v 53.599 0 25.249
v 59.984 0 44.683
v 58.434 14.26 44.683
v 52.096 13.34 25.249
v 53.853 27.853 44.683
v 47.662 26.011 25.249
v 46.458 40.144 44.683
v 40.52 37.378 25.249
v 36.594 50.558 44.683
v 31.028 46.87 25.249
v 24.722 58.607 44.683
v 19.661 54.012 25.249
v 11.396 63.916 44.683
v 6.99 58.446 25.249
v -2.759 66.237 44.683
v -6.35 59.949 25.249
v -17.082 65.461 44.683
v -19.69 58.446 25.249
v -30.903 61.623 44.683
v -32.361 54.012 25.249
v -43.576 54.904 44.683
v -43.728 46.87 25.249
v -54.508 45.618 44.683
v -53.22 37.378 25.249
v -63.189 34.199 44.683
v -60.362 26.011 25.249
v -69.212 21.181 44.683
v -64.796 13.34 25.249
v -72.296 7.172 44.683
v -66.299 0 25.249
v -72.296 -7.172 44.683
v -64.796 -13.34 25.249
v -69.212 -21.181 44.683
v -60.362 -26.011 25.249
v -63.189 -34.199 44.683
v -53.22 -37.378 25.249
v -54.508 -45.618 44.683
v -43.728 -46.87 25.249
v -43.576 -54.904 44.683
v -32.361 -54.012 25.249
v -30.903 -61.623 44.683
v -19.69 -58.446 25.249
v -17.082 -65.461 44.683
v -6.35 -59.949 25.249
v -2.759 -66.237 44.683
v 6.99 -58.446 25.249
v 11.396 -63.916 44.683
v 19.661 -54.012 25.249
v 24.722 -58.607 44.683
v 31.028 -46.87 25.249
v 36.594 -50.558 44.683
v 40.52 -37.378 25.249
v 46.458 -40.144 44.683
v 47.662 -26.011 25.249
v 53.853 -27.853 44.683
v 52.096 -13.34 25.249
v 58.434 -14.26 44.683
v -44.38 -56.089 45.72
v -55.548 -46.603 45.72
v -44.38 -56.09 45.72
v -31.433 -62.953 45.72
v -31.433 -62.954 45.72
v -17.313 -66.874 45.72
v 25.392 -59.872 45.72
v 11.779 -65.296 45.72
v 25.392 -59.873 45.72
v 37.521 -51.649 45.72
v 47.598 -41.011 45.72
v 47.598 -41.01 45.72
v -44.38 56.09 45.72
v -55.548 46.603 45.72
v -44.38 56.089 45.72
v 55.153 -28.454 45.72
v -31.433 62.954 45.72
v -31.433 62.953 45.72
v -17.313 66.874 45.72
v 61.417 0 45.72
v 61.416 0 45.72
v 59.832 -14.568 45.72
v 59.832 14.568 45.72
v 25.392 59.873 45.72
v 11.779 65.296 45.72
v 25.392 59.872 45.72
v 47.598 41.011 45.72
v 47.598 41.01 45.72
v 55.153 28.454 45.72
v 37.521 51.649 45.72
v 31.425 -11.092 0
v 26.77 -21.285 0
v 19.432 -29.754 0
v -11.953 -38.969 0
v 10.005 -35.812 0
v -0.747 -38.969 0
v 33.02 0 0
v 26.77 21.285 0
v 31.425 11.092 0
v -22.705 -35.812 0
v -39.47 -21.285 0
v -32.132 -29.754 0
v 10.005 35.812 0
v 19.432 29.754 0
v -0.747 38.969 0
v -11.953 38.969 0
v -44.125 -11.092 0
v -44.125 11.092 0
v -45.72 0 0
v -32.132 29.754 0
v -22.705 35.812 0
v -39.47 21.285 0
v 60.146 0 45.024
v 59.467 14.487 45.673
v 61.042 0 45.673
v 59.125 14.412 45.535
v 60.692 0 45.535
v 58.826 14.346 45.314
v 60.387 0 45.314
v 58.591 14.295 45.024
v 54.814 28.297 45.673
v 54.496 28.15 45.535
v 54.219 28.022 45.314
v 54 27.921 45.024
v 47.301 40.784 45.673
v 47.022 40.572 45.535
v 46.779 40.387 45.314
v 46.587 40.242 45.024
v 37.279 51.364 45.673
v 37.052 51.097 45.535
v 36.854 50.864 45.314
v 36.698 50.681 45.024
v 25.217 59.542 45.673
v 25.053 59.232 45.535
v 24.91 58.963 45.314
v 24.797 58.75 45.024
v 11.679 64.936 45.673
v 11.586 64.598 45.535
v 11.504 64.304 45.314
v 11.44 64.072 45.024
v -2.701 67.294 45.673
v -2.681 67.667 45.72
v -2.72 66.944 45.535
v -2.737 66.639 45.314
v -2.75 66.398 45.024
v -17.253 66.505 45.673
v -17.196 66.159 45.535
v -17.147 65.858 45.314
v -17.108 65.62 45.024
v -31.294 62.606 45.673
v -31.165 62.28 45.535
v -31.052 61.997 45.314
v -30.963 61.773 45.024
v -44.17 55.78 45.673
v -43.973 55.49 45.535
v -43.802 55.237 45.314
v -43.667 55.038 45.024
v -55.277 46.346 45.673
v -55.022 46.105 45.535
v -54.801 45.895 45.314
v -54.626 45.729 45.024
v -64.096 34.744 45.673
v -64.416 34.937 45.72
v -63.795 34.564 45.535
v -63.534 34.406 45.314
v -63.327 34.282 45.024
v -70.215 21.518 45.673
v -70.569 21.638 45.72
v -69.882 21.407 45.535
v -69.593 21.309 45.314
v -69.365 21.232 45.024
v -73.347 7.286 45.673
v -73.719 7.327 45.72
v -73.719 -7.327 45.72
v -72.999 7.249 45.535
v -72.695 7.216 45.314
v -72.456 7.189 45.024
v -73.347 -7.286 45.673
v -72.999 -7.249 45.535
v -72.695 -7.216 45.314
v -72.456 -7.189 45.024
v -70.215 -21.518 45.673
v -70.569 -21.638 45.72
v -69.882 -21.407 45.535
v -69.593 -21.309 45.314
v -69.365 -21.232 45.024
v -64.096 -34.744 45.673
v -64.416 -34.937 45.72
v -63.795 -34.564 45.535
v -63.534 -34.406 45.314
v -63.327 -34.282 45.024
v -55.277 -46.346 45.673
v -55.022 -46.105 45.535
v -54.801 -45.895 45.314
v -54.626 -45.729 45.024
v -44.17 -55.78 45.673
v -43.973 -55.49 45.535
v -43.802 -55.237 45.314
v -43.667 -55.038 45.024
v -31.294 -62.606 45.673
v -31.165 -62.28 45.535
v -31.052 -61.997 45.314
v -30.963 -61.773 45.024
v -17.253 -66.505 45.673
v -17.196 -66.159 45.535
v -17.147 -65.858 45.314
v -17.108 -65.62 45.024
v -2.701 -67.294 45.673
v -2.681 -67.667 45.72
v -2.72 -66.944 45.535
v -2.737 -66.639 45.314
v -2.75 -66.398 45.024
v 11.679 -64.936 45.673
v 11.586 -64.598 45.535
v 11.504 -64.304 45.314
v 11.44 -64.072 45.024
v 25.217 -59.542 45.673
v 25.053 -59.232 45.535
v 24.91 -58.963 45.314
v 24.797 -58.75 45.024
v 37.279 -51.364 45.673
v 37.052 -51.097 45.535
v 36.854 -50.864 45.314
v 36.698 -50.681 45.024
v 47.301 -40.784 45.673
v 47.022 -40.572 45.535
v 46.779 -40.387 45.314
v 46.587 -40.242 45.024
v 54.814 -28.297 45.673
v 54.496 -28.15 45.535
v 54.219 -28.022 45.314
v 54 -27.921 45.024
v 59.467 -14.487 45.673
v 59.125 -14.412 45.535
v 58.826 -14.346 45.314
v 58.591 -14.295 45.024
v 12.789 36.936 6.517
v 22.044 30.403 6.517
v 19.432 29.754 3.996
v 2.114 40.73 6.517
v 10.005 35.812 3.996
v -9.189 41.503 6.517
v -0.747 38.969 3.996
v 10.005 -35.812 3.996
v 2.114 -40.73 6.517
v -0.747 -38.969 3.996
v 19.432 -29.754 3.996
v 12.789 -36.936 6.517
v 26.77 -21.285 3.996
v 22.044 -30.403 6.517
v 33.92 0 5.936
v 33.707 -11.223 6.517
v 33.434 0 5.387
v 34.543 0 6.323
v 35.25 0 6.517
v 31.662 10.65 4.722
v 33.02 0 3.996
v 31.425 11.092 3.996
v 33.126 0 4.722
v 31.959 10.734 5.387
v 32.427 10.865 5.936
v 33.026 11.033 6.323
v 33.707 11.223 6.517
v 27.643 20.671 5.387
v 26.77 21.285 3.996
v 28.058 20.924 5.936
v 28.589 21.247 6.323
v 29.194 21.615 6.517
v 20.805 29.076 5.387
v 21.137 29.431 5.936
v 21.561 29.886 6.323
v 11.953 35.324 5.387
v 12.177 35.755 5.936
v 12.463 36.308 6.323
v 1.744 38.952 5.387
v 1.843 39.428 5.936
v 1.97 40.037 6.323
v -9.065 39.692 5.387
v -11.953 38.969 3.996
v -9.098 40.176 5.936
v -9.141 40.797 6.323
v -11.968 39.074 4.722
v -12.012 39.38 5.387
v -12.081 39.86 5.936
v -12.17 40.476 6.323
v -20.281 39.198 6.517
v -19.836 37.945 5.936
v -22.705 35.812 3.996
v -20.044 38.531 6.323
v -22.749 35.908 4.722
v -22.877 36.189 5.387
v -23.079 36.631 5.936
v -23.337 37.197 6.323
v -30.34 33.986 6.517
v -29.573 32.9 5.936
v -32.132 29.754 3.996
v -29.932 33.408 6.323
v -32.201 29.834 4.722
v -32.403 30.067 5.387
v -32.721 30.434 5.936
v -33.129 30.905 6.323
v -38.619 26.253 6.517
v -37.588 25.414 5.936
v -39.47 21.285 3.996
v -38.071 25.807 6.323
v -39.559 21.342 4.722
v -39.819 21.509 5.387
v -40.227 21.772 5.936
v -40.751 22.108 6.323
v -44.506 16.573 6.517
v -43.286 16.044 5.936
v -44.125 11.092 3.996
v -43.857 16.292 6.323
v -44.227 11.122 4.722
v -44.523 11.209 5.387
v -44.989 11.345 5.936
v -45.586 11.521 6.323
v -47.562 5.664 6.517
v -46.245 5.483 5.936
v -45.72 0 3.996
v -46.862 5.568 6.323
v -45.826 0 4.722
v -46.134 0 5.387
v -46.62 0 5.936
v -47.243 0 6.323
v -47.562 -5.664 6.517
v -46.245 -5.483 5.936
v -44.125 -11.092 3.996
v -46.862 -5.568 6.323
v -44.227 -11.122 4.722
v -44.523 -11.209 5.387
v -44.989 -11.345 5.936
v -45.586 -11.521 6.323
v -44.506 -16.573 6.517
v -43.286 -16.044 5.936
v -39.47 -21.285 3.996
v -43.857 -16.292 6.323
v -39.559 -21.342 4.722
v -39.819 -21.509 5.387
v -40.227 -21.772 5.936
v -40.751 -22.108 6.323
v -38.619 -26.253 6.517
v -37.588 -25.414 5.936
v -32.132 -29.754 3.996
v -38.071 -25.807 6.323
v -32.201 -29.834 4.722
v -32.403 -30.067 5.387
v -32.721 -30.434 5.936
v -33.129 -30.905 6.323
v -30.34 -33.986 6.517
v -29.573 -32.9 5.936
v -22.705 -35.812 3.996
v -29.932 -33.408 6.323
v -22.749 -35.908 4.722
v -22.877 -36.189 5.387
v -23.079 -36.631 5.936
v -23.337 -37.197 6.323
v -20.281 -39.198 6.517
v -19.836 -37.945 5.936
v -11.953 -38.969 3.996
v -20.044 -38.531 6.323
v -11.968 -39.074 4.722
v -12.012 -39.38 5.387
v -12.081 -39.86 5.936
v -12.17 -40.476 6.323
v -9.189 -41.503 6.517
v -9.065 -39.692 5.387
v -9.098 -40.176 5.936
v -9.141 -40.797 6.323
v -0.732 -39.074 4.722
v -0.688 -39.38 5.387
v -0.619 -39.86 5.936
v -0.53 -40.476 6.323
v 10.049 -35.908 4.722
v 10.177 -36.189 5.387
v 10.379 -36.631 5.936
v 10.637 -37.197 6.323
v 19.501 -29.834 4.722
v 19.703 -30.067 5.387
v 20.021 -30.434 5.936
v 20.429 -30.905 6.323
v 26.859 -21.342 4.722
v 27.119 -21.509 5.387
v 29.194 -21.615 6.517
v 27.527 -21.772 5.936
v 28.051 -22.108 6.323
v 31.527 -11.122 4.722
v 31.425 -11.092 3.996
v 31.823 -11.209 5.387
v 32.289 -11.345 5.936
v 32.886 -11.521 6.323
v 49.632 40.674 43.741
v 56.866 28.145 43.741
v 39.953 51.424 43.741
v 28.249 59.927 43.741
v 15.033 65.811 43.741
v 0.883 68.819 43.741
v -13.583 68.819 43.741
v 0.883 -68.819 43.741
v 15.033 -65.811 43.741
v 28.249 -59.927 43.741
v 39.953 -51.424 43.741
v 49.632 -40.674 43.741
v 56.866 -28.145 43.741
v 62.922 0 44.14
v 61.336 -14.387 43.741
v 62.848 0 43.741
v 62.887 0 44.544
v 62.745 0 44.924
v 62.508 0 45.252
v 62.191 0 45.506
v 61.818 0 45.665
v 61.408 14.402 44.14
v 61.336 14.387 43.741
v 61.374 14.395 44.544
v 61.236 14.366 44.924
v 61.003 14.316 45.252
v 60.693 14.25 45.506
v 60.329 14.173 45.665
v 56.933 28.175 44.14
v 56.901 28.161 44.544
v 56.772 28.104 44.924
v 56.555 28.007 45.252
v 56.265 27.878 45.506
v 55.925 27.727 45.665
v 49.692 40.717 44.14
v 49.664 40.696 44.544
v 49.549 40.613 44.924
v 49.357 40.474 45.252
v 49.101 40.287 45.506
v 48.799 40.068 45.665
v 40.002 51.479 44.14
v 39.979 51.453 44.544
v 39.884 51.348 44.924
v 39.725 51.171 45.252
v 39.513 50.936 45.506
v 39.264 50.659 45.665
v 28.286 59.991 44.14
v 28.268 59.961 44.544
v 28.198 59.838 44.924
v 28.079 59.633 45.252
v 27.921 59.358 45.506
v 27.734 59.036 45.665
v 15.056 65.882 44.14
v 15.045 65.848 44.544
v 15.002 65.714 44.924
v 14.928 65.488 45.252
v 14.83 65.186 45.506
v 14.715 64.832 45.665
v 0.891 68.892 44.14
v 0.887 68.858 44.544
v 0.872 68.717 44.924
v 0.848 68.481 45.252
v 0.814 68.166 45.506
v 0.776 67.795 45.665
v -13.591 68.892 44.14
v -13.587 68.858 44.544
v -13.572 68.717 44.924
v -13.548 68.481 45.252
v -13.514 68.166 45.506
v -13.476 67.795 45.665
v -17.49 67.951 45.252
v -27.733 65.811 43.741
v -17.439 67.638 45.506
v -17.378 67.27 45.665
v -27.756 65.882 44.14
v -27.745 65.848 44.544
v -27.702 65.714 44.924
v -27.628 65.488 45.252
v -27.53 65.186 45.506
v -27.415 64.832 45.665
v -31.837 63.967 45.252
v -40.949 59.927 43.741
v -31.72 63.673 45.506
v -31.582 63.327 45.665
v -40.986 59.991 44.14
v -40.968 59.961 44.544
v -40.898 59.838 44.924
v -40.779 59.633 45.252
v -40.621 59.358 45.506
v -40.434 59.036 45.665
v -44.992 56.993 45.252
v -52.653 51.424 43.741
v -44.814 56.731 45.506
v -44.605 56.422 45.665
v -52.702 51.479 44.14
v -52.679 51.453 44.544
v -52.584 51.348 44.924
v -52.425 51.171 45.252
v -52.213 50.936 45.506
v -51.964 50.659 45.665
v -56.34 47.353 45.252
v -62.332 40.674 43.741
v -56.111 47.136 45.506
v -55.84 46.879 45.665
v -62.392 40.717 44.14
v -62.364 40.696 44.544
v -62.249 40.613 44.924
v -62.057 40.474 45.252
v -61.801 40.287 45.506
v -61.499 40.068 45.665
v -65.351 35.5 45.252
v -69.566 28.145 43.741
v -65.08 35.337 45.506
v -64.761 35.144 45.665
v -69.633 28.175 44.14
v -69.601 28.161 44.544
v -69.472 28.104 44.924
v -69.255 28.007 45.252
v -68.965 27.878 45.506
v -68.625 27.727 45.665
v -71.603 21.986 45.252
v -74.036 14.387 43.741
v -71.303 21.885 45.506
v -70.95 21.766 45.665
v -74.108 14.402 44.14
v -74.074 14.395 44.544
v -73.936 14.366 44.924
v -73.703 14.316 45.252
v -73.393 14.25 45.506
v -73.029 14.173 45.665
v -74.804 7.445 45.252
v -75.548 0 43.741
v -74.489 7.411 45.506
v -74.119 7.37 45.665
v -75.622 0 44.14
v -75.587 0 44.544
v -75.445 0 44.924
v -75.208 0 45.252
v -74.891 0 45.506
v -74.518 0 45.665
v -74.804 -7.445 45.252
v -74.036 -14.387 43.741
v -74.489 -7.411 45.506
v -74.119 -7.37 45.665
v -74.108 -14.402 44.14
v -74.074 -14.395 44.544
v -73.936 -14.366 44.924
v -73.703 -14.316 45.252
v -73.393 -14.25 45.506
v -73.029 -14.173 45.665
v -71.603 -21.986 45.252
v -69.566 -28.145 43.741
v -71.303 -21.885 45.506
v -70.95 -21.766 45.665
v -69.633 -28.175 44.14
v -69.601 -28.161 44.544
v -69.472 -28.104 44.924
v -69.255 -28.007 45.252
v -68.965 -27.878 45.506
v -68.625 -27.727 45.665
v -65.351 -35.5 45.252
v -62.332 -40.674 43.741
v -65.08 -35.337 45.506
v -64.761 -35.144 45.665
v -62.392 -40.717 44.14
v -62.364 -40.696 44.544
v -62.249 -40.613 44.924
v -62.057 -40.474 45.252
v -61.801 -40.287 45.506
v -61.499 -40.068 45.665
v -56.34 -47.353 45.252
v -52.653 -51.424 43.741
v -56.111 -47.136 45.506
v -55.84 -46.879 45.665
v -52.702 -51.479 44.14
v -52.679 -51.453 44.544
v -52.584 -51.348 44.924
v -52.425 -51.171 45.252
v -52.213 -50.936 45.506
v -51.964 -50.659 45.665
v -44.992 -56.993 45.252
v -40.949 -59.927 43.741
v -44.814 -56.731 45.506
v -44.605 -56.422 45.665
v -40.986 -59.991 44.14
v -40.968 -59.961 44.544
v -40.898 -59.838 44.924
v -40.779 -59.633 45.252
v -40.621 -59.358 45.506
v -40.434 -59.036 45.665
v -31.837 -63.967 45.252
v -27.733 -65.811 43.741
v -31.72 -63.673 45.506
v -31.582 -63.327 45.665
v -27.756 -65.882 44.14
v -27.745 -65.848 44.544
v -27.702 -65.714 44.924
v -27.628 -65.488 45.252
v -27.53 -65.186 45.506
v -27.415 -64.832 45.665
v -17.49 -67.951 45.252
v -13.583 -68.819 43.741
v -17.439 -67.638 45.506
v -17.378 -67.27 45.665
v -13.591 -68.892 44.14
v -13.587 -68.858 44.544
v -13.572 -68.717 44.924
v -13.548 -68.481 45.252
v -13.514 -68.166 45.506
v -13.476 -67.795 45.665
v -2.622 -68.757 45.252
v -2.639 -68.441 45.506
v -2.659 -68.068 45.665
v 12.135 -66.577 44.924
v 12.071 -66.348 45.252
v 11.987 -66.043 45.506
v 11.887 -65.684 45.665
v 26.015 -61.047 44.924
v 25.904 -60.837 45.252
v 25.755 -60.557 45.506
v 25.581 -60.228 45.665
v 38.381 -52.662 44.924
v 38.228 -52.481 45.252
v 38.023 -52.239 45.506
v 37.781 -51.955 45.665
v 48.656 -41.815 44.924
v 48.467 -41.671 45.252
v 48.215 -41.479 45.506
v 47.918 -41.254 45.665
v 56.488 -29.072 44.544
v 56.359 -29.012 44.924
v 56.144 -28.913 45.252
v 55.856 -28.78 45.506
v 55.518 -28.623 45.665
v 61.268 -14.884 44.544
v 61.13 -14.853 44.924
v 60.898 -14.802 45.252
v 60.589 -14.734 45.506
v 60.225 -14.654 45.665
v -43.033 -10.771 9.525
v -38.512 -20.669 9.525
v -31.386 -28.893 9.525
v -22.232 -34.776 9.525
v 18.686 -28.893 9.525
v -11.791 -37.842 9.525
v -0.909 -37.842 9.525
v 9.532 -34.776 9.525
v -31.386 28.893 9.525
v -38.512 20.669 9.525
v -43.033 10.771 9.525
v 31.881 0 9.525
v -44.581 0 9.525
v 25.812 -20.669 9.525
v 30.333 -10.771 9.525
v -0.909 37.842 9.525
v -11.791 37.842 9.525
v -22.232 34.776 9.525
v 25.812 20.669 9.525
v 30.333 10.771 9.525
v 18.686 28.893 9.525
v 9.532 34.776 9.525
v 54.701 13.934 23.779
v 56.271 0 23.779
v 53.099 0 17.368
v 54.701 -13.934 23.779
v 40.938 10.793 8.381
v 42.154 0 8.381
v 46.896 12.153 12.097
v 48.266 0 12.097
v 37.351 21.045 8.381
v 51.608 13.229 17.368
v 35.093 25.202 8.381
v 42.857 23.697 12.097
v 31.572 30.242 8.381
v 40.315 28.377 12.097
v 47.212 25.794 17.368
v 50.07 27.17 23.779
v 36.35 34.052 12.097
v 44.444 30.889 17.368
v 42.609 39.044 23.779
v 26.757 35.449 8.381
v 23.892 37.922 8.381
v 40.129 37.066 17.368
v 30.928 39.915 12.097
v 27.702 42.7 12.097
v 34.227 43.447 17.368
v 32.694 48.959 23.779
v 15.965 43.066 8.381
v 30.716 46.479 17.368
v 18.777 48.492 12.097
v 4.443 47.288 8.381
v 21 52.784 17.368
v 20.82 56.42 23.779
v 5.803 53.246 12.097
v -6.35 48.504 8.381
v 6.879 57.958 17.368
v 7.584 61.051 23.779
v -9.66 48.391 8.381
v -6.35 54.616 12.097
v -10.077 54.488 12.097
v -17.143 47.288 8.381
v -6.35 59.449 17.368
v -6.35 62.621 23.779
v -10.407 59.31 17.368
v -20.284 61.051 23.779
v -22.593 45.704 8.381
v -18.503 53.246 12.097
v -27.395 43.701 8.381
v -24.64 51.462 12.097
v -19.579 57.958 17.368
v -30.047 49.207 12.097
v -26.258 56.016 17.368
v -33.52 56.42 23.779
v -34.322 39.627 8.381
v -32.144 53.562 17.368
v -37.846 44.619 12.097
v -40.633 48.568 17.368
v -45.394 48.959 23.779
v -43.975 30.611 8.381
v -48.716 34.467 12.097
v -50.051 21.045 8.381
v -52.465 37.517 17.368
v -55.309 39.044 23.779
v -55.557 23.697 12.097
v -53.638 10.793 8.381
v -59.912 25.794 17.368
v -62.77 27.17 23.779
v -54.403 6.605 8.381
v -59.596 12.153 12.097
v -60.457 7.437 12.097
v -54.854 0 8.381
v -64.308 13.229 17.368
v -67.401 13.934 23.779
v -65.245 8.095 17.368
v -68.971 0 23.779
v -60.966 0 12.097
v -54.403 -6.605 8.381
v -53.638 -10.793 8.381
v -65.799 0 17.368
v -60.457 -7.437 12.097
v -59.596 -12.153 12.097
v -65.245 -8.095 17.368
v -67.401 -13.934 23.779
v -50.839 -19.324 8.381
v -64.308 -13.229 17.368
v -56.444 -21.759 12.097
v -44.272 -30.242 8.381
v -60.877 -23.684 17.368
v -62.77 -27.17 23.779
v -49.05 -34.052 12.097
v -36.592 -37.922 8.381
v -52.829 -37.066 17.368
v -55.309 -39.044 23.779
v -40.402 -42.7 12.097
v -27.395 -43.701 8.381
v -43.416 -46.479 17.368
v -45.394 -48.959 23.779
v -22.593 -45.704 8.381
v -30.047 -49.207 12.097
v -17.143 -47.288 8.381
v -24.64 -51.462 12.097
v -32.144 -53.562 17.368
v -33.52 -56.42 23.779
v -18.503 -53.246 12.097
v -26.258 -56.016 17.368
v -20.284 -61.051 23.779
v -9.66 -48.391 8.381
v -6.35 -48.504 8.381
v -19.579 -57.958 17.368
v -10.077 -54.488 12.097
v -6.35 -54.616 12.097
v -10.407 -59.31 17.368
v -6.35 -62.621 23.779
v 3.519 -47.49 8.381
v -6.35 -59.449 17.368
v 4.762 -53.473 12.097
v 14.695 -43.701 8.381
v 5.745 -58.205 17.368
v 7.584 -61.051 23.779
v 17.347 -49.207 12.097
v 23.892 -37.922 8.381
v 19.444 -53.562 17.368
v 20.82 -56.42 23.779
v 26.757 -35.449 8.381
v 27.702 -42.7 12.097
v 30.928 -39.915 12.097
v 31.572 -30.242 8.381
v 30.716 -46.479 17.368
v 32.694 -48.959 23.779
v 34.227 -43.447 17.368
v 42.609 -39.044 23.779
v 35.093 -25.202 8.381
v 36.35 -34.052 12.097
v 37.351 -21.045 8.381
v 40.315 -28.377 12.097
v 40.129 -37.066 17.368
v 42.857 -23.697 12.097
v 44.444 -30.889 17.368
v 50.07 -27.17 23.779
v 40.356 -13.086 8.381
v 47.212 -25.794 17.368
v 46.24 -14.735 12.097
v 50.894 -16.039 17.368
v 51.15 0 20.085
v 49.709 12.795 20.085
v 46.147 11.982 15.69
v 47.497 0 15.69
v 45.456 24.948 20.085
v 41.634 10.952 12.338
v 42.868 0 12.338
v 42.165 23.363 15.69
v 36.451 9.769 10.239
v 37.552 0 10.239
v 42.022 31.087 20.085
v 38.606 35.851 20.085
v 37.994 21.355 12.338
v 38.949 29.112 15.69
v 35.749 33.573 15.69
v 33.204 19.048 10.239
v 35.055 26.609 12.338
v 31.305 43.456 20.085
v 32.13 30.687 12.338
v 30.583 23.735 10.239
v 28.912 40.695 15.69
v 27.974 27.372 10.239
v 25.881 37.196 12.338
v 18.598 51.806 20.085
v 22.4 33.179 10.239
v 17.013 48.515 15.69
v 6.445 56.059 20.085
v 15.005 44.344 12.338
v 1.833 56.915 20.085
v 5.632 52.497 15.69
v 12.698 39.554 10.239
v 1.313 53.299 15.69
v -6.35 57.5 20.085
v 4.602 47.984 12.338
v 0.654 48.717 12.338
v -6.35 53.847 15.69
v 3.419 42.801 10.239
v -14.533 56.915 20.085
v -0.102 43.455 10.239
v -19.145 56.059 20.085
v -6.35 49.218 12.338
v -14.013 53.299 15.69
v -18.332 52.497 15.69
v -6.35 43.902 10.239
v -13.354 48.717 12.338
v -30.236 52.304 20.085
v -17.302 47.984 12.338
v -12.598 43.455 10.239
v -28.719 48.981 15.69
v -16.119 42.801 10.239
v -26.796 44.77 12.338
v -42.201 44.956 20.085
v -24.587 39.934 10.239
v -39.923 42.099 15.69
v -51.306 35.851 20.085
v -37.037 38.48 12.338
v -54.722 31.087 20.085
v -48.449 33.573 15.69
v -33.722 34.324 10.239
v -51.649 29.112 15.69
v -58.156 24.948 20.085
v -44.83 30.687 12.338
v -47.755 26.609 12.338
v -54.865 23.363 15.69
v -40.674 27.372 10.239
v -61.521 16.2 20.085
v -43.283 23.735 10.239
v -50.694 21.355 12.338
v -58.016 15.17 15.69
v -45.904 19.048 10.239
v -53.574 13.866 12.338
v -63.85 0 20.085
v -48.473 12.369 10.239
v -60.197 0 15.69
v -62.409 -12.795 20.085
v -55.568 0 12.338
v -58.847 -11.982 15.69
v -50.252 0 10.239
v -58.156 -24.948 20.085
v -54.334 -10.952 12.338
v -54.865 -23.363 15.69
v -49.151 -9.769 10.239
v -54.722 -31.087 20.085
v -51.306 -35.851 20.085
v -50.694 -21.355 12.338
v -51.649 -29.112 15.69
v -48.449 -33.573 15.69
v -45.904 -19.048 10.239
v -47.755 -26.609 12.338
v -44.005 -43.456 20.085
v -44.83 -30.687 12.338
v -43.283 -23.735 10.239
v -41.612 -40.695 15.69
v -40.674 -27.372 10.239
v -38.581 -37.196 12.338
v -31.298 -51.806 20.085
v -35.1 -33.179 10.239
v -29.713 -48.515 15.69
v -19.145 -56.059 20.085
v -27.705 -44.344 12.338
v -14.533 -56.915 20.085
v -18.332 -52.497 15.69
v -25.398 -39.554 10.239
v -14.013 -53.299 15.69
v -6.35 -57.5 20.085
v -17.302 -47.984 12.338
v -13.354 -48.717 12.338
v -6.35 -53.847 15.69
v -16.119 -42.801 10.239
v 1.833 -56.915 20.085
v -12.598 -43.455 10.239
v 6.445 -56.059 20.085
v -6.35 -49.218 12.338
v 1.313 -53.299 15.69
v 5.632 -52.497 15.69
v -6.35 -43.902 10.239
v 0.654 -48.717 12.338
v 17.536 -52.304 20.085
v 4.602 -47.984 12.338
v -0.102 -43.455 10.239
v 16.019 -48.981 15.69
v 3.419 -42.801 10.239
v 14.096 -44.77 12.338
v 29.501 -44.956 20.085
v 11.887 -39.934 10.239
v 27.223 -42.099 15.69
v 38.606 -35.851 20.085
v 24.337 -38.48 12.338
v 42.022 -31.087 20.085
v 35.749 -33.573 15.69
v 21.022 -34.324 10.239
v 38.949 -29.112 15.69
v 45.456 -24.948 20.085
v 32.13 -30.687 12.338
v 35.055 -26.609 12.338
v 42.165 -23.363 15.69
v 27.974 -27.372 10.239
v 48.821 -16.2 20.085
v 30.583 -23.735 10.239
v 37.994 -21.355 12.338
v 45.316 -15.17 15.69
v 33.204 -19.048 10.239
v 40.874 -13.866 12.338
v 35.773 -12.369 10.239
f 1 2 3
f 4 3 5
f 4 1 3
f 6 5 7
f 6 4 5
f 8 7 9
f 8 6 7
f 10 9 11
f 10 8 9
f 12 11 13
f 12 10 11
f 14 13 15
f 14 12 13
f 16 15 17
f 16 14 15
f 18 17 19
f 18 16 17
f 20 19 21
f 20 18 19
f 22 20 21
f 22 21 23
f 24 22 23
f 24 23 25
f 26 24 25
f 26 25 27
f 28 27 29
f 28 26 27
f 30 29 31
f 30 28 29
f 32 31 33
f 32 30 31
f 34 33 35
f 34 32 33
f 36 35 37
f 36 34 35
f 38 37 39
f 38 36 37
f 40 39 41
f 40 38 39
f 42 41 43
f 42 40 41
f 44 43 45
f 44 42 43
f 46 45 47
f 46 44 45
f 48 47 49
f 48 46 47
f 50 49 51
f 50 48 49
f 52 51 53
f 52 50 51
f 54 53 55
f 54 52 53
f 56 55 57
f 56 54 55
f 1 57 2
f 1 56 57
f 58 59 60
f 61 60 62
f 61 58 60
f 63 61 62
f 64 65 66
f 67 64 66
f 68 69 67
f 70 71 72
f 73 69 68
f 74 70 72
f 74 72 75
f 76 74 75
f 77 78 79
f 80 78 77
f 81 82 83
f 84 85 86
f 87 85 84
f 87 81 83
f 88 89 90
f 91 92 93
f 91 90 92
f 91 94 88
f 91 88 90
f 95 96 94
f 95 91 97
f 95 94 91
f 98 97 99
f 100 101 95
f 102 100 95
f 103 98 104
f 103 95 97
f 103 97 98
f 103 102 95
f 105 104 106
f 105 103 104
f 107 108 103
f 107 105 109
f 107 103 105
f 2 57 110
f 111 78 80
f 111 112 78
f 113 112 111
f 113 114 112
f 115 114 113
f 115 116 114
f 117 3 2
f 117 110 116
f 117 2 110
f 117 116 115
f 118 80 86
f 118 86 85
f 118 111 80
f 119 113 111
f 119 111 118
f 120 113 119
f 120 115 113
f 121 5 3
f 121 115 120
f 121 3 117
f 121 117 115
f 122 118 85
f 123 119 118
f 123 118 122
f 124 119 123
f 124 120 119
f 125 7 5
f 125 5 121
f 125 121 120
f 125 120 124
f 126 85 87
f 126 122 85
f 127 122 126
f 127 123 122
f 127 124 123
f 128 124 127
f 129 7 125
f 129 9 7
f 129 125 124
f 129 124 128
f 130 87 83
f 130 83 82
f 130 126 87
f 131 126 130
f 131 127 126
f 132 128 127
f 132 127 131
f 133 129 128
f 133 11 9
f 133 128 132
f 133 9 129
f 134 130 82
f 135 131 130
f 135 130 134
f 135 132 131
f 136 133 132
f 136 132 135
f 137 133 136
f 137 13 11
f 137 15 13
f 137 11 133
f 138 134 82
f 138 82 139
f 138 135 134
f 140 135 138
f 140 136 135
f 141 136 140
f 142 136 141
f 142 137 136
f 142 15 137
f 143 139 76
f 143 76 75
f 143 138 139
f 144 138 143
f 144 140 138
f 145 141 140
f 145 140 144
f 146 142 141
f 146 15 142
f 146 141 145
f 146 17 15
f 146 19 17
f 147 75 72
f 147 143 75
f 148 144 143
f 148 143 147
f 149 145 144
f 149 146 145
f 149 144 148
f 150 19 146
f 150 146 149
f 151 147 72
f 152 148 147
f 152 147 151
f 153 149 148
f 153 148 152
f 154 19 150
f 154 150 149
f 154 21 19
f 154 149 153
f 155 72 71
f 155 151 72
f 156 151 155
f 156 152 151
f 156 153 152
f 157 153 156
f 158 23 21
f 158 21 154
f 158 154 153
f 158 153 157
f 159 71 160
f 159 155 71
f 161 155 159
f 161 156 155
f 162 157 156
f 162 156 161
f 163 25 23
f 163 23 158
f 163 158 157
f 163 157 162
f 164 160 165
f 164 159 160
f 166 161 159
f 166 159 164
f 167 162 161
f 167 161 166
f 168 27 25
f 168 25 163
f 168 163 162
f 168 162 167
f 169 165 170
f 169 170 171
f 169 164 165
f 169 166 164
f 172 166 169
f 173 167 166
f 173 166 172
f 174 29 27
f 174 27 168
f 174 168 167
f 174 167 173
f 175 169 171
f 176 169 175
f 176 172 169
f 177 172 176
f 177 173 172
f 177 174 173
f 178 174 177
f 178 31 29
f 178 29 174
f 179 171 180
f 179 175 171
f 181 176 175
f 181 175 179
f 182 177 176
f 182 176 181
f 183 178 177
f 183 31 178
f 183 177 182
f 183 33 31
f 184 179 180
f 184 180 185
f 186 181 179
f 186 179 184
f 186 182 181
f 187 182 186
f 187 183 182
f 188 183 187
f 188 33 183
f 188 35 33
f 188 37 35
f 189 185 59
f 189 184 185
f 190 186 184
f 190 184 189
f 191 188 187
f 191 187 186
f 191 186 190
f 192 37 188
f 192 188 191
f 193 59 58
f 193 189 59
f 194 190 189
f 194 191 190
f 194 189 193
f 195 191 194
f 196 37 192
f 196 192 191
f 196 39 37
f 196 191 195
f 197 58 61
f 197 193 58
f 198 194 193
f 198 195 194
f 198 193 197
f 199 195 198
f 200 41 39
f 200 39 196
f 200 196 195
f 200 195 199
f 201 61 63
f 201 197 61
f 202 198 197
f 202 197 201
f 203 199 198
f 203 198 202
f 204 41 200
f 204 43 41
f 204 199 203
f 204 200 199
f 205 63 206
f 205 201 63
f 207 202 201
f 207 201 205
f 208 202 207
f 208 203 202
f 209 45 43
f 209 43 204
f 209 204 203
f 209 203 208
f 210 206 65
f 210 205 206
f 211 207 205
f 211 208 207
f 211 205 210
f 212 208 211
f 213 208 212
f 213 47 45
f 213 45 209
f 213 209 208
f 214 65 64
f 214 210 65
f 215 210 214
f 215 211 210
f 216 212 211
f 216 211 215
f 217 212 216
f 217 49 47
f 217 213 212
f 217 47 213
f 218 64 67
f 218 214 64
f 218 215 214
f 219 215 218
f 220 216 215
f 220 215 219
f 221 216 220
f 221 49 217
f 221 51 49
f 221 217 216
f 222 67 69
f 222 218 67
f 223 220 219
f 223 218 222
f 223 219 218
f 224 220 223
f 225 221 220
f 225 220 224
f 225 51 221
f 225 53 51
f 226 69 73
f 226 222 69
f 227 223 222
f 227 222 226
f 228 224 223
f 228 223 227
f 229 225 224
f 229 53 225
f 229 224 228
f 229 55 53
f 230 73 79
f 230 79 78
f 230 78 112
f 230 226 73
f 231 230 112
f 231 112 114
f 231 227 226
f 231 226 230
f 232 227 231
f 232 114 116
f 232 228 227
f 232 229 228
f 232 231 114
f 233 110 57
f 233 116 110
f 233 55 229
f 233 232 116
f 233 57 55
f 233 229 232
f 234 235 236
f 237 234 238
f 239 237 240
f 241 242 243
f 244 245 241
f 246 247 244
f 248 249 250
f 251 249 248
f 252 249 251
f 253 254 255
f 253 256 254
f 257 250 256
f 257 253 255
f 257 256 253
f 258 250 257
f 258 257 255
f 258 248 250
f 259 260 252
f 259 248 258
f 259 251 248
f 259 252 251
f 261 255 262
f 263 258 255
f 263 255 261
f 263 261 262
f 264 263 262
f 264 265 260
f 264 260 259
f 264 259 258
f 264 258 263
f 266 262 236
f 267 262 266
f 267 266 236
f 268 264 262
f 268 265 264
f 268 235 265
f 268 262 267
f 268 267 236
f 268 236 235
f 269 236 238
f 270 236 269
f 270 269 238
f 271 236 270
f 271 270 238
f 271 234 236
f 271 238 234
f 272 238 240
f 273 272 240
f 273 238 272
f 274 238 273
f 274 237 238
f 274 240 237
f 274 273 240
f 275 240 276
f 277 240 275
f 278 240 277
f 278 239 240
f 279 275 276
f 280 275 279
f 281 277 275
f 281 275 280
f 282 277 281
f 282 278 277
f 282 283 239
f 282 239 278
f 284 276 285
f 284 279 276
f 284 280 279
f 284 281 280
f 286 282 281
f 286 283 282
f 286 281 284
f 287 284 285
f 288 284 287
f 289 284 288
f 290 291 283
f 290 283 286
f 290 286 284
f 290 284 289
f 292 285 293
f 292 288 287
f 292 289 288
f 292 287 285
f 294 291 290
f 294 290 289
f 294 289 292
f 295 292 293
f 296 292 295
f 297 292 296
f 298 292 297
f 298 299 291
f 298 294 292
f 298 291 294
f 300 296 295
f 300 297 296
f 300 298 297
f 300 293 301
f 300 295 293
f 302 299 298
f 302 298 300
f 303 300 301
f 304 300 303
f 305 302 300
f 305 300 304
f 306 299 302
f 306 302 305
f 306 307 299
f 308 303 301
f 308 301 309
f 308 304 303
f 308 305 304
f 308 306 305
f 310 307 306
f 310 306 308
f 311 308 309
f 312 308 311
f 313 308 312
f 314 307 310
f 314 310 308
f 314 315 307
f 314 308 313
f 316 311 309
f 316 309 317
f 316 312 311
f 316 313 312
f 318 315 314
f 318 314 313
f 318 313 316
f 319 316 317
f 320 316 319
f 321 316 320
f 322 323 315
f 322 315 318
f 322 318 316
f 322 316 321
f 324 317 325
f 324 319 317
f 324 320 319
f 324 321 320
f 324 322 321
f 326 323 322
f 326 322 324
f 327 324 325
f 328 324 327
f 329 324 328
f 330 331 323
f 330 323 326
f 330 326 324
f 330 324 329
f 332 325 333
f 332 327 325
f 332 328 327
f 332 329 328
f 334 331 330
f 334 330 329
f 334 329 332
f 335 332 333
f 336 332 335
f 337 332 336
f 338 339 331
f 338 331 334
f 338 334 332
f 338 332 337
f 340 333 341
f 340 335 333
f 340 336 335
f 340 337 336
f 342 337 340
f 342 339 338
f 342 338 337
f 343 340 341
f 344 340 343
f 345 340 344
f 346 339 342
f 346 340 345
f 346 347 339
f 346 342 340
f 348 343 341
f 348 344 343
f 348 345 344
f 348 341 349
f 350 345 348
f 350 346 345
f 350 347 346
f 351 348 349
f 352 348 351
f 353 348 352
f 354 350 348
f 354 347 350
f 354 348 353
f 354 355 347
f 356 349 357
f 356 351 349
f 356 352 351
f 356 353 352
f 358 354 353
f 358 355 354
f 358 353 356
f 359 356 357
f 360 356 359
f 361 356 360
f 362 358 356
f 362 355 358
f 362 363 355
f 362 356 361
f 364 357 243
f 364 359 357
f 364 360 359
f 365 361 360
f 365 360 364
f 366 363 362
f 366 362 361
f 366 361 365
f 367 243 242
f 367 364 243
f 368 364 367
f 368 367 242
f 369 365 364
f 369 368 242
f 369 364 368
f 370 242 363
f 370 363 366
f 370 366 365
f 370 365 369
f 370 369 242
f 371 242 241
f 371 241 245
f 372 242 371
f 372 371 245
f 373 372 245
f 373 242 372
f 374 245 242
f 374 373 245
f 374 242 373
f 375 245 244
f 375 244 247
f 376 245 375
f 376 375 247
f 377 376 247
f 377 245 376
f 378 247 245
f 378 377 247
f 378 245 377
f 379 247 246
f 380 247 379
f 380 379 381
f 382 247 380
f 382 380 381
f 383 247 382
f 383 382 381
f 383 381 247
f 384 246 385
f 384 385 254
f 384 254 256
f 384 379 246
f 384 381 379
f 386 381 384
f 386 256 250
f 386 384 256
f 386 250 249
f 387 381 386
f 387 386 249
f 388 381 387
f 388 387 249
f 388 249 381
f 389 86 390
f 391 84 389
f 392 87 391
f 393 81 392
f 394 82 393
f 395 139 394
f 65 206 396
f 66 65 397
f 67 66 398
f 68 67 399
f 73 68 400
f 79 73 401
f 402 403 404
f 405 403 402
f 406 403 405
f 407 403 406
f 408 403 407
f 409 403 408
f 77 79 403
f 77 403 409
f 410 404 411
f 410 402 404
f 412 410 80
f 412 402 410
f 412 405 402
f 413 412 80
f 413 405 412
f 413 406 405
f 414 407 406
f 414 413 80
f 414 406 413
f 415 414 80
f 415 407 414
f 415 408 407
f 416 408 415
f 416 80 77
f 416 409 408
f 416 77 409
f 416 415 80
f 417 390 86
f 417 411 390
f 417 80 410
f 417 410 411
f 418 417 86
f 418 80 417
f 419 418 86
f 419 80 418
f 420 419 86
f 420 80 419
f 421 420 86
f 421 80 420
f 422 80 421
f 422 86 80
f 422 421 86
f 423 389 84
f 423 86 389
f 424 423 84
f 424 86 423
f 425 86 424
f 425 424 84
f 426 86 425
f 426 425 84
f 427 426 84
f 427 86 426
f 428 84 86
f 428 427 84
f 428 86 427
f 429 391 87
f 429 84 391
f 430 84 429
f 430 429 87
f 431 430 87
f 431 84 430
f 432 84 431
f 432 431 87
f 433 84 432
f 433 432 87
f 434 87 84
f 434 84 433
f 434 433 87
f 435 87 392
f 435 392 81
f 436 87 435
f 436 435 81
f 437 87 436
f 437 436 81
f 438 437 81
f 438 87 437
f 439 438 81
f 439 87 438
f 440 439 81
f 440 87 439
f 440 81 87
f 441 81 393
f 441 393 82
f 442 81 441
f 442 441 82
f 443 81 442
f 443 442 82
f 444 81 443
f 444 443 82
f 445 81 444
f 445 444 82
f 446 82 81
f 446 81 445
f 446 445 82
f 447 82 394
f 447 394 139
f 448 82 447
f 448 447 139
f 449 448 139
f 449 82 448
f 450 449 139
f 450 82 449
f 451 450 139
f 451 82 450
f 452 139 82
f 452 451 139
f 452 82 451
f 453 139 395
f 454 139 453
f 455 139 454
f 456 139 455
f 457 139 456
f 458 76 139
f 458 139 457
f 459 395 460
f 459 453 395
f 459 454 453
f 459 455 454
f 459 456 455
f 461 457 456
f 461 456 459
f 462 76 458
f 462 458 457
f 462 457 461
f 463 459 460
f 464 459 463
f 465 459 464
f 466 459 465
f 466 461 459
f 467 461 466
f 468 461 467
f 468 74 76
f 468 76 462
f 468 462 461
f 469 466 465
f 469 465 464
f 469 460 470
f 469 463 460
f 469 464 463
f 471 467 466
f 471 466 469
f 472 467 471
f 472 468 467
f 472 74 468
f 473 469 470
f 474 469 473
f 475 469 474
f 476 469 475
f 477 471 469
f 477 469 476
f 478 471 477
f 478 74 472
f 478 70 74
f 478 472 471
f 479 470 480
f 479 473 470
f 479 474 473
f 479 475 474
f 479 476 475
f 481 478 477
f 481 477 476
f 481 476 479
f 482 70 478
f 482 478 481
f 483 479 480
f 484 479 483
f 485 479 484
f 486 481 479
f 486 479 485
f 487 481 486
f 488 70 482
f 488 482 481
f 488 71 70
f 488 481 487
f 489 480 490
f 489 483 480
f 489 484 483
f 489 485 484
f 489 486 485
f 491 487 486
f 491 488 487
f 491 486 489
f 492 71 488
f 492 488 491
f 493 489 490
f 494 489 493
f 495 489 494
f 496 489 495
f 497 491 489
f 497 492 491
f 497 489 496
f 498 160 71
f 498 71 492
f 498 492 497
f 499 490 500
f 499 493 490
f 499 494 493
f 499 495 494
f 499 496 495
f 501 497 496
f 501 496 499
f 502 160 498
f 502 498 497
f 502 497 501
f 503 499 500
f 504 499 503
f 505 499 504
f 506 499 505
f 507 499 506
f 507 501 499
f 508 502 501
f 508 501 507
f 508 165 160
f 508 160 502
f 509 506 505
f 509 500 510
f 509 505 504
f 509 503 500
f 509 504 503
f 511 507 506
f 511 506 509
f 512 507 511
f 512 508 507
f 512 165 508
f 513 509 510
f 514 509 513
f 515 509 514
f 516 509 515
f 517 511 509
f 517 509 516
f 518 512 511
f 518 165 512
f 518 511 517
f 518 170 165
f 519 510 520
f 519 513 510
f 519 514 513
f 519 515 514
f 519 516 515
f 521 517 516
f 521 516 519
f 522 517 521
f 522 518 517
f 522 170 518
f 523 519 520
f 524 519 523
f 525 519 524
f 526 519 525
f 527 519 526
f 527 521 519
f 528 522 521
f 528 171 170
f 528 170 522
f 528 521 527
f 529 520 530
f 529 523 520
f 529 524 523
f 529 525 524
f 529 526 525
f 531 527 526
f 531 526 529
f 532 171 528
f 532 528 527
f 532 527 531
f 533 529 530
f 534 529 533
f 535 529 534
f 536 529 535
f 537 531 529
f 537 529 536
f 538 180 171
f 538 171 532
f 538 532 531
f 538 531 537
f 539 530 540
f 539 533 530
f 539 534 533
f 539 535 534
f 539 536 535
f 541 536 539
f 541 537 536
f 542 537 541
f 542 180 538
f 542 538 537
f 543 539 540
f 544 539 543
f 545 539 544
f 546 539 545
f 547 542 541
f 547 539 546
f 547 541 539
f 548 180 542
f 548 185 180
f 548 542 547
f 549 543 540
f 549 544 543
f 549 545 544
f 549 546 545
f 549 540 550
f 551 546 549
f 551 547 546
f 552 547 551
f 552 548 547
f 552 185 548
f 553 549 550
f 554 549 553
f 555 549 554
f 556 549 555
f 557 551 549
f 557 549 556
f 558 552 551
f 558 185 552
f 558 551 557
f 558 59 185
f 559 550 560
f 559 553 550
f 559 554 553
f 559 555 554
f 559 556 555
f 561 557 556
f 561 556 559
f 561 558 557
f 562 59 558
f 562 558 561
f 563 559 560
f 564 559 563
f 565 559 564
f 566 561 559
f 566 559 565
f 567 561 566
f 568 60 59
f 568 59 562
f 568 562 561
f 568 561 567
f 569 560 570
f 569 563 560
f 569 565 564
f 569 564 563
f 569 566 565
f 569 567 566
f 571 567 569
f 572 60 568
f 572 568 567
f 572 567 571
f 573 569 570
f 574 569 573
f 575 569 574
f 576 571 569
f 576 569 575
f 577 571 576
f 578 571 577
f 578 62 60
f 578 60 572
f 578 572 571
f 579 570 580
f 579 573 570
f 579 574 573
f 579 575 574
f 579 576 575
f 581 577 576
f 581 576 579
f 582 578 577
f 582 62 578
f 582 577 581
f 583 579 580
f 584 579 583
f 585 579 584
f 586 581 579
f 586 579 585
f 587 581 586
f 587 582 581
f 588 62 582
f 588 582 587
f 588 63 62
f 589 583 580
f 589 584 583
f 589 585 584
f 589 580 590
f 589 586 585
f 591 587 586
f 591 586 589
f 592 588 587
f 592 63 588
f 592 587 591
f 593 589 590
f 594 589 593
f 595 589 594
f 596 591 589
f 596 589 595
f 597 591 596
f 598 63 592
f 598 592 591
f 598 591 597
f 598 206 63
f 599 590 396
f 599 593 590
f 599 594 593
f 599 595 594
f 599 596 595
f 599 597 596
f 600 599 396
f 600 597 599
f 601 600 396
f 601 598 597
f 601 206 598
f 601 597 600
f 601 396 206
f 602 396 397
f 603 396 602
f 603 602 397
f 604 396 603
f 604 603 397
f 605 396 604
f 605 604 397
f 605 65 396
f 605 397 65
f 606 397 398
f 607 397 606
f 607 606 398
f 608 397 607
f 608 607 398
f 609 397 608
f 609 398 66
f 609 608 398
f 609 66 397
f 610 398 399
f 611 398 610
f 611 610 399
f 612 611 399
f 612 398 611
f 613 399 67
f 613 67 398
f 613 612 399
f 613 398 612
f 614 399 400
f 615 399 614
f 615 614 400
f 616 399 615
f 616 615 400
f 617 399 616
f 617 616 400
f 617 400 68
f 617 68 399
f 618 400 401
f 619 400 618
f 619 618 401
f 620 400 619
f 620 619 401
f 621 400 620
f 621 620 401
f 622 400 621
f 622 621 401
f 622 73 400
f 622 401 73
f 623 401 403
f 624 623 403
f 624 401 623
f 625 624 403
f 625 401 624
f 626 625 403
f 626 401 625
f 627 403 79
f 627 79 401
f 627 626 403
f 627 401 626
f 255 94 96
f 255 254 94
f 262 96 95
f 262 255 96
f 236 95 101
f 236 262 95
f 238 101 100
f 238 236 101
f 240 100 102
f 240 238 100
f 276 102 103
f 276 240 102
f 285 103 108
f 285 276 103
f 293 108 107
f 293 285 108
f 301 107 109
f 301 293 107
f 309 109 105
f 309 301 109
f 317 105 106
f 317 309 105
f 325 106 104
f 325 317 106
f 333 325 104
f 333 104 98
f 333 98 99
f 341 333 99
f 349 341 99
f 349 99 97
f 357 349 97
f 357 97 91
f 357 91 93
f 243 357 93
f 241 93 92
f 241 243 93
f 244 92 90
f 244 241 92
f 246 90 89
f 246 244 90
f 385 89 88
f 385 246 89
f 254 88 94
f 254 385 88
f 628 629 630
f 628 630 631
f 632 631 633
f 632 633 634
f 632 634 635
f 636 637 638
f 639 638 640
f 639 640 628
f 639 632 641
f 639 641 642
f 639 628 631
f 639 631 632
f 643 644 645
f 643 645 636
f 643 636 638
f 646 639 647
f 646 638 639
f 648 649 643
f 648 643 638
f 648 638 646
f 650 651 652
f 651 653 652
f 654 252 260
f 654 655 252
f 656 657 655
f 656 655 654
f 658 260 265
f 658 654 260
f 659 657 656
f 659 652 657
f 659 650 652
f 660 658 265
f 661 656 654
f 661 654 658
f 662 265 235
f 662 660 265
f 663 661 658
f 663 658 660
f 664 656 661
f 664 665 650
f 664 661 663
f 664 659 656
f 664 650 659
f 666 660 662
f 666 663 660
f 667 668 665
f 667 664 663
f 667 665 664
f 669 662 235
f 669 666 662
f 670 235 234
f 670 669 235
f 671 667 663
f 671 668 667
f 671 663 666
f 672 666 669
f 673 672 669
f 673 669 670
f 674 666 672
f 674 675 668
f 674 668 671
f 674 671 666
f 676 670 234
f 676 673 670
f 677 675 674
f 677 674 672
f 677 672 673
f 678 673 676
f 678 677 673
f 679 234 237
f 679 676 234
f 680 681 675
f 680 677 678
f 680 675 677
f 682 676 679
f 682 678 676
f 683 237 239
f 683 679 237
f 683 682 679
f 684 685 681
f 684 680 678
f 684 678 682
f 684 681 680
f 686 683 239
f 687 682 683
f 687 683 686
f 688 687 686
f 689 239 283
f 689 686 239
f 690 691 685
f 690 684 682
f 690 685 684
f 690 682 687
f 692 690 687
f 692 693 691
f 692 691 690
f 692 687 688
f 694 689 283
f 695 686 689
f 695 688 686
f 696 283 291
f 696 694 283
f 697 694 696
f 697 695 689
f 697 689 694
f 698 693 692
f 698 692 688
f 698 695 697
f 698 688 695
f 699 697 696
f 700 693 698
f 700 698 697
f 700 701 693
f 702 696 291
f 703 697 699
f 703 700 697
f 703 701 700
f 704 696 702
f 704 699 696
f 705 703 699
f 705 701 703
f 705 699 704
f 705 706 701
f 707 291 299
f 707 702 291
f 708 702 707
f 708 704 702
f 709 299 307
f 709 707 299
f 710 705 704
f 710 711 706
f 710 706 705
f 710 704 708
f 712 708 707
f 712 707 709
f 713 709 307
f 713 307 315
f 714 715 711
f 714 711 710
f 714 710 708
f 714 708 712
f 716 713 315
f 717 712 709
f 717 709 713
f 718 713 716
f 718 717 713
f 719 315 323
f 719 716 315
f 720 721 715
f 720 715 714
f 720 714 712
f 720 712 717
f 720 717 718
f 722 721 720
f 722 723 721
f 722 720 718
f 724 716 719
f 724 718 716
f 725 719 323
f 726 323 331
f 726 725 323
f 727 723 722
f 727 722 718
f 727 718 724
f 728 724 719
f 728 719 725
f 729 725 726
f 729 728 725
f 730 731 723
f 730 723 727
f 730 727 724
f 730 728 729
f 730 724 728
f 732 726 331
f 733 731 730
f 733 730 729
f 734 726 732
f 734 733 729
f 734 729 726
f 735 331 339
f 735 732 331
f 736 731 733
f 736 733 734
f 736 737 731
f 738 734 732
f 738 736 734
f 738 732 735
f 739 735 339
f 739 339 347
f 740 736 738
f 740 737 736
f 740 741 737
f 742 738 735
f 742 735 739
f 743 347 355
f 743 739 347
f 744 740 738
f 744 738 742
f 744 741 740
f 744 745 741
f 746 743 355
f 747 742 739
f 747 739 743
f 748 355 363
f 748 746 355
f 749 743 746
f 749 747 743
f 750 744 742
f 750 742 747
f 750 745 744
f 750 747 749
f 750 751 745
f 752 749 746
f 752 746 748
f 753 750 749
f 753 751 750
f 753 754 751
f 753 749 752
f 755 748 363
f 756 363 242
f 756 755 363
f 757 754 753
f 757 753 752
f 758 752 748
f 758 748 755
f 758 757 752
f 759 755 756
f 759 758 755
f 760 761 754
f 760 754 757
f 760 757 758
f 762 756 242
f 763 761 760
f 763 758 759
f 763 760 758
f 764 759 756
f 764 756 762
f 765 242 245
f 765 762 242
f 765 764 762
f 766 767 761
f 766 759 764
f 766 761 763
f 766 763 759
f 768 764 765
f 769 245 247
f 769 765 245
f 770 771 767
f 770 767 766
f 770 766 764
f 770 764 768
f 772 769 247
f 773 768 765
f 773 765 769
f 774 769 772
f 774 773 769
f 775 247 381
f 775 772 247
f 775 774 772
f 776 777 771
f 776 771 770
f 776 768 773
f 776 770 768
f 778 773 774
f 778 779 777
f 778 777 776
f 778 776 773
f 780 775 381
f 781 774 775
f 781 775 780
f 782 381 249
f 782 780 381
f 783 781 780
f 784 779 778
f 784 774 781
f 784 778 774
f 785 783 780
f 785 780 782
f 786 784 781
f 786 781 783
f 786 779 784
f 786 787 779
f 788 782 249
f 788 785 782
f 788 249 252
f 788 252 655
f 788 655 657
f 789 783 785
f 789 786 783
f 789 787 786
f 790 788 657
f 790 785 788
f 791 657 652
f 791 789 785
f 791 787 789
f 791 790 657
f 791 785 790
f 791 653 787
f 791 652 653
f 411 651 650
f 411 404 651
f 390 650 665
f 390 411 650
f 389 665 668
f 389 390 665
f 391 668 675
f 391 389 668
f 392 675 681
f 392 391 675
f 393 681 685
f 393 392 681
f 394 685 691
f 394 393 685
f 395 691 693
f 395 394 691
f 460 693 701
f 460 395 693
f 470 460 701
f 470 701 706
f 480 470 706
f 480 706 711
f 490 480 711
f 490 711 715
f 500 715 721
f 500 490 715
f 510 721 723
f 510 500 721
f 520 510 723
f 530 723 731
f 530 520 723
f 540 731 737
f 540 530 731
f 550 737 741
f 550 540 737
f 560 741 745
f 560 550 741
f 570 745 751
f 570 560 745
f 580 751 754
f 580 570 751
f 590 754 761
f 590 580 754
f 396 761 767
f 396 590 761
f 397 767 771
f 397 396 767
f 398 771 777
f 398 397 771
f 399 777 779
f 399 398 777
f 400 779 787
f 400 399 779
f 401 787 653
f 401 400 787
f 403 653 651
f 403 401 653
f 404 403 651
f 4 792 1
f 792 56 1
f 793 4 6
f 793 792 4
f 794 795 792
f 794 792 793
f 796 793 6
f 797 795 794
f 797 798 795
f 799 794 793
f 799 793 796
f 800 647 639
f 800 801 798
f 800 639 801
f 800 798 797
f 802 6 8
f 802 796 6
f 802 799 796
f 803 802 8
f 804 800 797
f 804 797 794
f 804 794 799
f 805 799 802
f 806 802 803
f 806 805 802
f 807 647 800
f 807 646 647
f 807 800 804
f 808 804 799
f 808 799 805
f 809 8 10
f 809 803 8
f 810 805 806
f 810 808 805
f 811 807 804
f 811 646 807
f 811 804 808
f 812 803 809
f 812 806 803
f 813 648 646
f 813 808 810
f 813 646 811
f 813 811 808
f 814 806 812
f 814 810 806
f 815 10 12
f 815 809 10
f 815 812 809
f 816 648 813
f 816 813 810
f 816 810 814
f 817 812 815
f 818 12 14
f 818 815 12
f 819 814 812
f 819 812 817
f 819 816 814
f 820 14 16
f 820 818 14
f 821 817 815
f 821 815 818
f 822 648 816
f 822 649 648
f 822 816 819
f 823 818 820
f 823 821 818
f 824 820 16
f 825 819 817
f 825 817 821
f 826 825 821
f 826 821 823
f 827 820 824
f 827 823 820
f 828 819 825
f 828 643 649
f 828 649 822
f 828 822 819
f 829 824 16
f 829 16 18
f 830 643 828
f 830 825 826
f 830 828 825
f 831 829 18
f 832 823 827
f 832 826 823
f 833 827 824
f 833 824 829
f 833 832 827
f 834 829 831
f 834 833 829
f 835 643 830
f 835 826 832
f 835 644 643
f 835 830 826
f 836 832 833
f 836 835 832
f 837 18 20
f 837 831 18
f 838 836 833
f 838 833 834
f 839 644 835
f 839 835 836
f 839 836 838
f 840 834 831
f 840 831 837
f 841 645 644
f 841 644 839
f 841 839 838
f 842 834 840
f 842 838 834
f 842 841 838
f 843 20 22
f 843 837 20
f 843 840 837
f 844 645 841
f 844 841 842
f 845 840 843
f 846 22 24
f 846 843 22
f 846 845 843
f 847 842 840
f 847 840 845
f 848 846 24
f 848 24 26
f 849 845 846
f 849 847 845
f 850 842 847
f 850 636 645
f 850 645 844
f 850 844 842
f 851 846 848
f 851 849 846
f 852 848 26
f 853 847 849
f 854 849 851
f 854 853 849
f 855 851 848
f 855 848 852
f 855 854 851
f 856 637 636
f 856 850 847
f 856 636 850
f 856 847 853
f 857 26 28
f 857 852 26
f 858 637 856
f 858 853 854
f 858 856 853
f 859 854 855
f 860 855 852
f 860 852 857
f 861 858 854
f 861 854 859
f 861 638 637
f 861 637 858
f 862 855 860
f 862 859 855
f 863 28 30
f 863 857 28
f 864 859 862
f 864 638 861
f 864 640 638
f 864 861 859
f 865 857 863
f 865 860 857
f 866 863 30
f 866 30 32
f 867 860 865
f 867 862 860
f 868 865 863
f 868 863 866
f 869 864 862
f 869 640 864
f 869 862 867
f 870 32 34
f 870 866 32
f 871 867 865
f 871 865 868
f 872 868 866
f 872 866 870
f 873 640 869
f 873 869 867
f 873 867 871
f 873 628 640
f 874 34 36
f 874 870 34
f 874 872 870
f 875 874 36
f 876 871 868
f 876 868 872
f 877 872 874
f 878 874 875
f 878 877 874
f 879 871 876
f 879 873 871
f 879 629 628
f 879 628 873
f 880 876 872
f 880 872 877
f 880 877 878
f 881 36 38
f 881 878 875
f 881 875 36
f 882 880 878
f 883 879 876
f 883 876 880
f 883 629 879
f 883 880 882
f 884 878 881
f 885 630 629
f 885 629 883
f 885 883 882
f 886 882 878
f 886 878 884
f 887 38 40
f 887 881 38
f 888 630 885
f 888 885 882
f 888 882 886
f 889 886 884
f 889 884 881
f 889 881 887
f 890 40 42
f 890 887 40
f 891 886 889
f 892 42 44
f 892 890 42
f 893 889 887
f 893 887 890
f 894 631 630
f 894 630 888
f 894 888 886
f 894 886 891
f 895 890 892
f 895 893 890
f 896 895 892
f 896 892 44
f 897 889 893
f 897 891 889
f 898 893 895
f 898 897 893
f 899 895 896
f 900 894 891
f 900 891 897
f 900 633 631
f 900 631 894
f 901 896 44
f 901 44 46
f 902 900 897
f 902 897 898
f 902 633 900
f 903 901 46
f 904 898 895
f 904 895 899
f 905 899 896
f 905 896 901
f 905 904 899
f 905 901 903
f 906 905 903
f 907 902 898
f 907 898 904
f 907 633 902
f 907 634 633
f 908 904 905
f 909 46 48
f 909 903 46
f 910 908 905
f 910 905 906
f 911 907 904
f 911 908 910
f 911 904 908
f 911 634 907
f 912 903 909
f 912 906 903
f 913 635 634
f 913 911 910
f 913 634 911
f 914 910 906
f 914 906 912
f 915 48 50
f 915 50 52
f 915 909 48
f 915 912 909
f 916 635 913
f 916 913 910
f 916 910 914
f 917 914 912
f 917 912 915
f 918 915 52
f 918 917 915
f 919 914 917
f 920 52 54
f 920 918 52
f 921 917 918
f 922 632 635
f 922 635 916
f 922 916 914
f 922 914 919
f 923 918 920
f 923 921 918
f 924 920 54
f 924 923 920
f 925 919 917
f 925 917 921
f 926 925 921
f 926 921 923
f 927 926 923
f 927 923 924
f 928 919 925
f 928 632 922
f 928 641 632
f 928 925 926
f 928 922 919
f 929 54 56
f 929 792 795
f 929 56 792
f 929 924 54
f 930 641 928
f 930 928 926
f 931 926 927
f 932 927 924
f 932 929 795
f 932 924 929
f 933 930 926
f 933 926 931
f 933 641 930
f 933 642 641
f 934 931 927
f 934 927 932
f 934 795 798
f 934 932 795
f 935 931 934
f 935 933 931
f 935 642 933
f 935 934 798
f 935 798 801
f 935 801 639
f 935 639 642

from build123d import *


with BuildPart() as f1:
    # F0 (on Front) → F1 (revolve)
    with BuildSketch(Plane.XZ):
        with BuildLine():
            ThreePointArc((62.848027, 43.741147), (62.637688, 45.096197), (61.416511, 45.72))
            Line((61.416511, 45.72), (61.416267, 45.72))
            ThreePointArc((61.416267, 45.72), (60.532359, 45.433605), (59.984365, 44.68326))
            Line((59.984365, 44.68326), (53.599079, 25.249327))
            ThreePointArc((53.599079, 25.249327), (45.28761, 13.868776), (31.881304, 9.525))
            Line((31.881304, 9.525), (25.4, 9.525))
            Line((25.4, 9.525), (0, 9.525))
            Line((0, 9.525), (-6.35, 9.525))
            Line((-6.35, 9.525), (-6.35, 0))
            Line((-6.35, 0), (0, 0))
            Line((0, 0), (24.376065, 0))
            Line((24.376065, 0), (31.321423, 0))
            Line((31.321423, 0), (33.02, 0))
            Line((33.02, 0), (33.02, 3.996068))
            ThreePointArc((33.02, 3.996068), (33.657398, 5.678835), (35.249688, 6.517042))
            ThreePointArc((35.249688, 6.517042), (48.265616, 12.09679), (56.270939, 23.778518))
            Line((56.270939, 23.778518), (62.848027, 43.741147))
        make_face()
    revolve(axis=Axis((-6.35, 0, 4.7625), (0, 0, 1)))


solid = f1.part
